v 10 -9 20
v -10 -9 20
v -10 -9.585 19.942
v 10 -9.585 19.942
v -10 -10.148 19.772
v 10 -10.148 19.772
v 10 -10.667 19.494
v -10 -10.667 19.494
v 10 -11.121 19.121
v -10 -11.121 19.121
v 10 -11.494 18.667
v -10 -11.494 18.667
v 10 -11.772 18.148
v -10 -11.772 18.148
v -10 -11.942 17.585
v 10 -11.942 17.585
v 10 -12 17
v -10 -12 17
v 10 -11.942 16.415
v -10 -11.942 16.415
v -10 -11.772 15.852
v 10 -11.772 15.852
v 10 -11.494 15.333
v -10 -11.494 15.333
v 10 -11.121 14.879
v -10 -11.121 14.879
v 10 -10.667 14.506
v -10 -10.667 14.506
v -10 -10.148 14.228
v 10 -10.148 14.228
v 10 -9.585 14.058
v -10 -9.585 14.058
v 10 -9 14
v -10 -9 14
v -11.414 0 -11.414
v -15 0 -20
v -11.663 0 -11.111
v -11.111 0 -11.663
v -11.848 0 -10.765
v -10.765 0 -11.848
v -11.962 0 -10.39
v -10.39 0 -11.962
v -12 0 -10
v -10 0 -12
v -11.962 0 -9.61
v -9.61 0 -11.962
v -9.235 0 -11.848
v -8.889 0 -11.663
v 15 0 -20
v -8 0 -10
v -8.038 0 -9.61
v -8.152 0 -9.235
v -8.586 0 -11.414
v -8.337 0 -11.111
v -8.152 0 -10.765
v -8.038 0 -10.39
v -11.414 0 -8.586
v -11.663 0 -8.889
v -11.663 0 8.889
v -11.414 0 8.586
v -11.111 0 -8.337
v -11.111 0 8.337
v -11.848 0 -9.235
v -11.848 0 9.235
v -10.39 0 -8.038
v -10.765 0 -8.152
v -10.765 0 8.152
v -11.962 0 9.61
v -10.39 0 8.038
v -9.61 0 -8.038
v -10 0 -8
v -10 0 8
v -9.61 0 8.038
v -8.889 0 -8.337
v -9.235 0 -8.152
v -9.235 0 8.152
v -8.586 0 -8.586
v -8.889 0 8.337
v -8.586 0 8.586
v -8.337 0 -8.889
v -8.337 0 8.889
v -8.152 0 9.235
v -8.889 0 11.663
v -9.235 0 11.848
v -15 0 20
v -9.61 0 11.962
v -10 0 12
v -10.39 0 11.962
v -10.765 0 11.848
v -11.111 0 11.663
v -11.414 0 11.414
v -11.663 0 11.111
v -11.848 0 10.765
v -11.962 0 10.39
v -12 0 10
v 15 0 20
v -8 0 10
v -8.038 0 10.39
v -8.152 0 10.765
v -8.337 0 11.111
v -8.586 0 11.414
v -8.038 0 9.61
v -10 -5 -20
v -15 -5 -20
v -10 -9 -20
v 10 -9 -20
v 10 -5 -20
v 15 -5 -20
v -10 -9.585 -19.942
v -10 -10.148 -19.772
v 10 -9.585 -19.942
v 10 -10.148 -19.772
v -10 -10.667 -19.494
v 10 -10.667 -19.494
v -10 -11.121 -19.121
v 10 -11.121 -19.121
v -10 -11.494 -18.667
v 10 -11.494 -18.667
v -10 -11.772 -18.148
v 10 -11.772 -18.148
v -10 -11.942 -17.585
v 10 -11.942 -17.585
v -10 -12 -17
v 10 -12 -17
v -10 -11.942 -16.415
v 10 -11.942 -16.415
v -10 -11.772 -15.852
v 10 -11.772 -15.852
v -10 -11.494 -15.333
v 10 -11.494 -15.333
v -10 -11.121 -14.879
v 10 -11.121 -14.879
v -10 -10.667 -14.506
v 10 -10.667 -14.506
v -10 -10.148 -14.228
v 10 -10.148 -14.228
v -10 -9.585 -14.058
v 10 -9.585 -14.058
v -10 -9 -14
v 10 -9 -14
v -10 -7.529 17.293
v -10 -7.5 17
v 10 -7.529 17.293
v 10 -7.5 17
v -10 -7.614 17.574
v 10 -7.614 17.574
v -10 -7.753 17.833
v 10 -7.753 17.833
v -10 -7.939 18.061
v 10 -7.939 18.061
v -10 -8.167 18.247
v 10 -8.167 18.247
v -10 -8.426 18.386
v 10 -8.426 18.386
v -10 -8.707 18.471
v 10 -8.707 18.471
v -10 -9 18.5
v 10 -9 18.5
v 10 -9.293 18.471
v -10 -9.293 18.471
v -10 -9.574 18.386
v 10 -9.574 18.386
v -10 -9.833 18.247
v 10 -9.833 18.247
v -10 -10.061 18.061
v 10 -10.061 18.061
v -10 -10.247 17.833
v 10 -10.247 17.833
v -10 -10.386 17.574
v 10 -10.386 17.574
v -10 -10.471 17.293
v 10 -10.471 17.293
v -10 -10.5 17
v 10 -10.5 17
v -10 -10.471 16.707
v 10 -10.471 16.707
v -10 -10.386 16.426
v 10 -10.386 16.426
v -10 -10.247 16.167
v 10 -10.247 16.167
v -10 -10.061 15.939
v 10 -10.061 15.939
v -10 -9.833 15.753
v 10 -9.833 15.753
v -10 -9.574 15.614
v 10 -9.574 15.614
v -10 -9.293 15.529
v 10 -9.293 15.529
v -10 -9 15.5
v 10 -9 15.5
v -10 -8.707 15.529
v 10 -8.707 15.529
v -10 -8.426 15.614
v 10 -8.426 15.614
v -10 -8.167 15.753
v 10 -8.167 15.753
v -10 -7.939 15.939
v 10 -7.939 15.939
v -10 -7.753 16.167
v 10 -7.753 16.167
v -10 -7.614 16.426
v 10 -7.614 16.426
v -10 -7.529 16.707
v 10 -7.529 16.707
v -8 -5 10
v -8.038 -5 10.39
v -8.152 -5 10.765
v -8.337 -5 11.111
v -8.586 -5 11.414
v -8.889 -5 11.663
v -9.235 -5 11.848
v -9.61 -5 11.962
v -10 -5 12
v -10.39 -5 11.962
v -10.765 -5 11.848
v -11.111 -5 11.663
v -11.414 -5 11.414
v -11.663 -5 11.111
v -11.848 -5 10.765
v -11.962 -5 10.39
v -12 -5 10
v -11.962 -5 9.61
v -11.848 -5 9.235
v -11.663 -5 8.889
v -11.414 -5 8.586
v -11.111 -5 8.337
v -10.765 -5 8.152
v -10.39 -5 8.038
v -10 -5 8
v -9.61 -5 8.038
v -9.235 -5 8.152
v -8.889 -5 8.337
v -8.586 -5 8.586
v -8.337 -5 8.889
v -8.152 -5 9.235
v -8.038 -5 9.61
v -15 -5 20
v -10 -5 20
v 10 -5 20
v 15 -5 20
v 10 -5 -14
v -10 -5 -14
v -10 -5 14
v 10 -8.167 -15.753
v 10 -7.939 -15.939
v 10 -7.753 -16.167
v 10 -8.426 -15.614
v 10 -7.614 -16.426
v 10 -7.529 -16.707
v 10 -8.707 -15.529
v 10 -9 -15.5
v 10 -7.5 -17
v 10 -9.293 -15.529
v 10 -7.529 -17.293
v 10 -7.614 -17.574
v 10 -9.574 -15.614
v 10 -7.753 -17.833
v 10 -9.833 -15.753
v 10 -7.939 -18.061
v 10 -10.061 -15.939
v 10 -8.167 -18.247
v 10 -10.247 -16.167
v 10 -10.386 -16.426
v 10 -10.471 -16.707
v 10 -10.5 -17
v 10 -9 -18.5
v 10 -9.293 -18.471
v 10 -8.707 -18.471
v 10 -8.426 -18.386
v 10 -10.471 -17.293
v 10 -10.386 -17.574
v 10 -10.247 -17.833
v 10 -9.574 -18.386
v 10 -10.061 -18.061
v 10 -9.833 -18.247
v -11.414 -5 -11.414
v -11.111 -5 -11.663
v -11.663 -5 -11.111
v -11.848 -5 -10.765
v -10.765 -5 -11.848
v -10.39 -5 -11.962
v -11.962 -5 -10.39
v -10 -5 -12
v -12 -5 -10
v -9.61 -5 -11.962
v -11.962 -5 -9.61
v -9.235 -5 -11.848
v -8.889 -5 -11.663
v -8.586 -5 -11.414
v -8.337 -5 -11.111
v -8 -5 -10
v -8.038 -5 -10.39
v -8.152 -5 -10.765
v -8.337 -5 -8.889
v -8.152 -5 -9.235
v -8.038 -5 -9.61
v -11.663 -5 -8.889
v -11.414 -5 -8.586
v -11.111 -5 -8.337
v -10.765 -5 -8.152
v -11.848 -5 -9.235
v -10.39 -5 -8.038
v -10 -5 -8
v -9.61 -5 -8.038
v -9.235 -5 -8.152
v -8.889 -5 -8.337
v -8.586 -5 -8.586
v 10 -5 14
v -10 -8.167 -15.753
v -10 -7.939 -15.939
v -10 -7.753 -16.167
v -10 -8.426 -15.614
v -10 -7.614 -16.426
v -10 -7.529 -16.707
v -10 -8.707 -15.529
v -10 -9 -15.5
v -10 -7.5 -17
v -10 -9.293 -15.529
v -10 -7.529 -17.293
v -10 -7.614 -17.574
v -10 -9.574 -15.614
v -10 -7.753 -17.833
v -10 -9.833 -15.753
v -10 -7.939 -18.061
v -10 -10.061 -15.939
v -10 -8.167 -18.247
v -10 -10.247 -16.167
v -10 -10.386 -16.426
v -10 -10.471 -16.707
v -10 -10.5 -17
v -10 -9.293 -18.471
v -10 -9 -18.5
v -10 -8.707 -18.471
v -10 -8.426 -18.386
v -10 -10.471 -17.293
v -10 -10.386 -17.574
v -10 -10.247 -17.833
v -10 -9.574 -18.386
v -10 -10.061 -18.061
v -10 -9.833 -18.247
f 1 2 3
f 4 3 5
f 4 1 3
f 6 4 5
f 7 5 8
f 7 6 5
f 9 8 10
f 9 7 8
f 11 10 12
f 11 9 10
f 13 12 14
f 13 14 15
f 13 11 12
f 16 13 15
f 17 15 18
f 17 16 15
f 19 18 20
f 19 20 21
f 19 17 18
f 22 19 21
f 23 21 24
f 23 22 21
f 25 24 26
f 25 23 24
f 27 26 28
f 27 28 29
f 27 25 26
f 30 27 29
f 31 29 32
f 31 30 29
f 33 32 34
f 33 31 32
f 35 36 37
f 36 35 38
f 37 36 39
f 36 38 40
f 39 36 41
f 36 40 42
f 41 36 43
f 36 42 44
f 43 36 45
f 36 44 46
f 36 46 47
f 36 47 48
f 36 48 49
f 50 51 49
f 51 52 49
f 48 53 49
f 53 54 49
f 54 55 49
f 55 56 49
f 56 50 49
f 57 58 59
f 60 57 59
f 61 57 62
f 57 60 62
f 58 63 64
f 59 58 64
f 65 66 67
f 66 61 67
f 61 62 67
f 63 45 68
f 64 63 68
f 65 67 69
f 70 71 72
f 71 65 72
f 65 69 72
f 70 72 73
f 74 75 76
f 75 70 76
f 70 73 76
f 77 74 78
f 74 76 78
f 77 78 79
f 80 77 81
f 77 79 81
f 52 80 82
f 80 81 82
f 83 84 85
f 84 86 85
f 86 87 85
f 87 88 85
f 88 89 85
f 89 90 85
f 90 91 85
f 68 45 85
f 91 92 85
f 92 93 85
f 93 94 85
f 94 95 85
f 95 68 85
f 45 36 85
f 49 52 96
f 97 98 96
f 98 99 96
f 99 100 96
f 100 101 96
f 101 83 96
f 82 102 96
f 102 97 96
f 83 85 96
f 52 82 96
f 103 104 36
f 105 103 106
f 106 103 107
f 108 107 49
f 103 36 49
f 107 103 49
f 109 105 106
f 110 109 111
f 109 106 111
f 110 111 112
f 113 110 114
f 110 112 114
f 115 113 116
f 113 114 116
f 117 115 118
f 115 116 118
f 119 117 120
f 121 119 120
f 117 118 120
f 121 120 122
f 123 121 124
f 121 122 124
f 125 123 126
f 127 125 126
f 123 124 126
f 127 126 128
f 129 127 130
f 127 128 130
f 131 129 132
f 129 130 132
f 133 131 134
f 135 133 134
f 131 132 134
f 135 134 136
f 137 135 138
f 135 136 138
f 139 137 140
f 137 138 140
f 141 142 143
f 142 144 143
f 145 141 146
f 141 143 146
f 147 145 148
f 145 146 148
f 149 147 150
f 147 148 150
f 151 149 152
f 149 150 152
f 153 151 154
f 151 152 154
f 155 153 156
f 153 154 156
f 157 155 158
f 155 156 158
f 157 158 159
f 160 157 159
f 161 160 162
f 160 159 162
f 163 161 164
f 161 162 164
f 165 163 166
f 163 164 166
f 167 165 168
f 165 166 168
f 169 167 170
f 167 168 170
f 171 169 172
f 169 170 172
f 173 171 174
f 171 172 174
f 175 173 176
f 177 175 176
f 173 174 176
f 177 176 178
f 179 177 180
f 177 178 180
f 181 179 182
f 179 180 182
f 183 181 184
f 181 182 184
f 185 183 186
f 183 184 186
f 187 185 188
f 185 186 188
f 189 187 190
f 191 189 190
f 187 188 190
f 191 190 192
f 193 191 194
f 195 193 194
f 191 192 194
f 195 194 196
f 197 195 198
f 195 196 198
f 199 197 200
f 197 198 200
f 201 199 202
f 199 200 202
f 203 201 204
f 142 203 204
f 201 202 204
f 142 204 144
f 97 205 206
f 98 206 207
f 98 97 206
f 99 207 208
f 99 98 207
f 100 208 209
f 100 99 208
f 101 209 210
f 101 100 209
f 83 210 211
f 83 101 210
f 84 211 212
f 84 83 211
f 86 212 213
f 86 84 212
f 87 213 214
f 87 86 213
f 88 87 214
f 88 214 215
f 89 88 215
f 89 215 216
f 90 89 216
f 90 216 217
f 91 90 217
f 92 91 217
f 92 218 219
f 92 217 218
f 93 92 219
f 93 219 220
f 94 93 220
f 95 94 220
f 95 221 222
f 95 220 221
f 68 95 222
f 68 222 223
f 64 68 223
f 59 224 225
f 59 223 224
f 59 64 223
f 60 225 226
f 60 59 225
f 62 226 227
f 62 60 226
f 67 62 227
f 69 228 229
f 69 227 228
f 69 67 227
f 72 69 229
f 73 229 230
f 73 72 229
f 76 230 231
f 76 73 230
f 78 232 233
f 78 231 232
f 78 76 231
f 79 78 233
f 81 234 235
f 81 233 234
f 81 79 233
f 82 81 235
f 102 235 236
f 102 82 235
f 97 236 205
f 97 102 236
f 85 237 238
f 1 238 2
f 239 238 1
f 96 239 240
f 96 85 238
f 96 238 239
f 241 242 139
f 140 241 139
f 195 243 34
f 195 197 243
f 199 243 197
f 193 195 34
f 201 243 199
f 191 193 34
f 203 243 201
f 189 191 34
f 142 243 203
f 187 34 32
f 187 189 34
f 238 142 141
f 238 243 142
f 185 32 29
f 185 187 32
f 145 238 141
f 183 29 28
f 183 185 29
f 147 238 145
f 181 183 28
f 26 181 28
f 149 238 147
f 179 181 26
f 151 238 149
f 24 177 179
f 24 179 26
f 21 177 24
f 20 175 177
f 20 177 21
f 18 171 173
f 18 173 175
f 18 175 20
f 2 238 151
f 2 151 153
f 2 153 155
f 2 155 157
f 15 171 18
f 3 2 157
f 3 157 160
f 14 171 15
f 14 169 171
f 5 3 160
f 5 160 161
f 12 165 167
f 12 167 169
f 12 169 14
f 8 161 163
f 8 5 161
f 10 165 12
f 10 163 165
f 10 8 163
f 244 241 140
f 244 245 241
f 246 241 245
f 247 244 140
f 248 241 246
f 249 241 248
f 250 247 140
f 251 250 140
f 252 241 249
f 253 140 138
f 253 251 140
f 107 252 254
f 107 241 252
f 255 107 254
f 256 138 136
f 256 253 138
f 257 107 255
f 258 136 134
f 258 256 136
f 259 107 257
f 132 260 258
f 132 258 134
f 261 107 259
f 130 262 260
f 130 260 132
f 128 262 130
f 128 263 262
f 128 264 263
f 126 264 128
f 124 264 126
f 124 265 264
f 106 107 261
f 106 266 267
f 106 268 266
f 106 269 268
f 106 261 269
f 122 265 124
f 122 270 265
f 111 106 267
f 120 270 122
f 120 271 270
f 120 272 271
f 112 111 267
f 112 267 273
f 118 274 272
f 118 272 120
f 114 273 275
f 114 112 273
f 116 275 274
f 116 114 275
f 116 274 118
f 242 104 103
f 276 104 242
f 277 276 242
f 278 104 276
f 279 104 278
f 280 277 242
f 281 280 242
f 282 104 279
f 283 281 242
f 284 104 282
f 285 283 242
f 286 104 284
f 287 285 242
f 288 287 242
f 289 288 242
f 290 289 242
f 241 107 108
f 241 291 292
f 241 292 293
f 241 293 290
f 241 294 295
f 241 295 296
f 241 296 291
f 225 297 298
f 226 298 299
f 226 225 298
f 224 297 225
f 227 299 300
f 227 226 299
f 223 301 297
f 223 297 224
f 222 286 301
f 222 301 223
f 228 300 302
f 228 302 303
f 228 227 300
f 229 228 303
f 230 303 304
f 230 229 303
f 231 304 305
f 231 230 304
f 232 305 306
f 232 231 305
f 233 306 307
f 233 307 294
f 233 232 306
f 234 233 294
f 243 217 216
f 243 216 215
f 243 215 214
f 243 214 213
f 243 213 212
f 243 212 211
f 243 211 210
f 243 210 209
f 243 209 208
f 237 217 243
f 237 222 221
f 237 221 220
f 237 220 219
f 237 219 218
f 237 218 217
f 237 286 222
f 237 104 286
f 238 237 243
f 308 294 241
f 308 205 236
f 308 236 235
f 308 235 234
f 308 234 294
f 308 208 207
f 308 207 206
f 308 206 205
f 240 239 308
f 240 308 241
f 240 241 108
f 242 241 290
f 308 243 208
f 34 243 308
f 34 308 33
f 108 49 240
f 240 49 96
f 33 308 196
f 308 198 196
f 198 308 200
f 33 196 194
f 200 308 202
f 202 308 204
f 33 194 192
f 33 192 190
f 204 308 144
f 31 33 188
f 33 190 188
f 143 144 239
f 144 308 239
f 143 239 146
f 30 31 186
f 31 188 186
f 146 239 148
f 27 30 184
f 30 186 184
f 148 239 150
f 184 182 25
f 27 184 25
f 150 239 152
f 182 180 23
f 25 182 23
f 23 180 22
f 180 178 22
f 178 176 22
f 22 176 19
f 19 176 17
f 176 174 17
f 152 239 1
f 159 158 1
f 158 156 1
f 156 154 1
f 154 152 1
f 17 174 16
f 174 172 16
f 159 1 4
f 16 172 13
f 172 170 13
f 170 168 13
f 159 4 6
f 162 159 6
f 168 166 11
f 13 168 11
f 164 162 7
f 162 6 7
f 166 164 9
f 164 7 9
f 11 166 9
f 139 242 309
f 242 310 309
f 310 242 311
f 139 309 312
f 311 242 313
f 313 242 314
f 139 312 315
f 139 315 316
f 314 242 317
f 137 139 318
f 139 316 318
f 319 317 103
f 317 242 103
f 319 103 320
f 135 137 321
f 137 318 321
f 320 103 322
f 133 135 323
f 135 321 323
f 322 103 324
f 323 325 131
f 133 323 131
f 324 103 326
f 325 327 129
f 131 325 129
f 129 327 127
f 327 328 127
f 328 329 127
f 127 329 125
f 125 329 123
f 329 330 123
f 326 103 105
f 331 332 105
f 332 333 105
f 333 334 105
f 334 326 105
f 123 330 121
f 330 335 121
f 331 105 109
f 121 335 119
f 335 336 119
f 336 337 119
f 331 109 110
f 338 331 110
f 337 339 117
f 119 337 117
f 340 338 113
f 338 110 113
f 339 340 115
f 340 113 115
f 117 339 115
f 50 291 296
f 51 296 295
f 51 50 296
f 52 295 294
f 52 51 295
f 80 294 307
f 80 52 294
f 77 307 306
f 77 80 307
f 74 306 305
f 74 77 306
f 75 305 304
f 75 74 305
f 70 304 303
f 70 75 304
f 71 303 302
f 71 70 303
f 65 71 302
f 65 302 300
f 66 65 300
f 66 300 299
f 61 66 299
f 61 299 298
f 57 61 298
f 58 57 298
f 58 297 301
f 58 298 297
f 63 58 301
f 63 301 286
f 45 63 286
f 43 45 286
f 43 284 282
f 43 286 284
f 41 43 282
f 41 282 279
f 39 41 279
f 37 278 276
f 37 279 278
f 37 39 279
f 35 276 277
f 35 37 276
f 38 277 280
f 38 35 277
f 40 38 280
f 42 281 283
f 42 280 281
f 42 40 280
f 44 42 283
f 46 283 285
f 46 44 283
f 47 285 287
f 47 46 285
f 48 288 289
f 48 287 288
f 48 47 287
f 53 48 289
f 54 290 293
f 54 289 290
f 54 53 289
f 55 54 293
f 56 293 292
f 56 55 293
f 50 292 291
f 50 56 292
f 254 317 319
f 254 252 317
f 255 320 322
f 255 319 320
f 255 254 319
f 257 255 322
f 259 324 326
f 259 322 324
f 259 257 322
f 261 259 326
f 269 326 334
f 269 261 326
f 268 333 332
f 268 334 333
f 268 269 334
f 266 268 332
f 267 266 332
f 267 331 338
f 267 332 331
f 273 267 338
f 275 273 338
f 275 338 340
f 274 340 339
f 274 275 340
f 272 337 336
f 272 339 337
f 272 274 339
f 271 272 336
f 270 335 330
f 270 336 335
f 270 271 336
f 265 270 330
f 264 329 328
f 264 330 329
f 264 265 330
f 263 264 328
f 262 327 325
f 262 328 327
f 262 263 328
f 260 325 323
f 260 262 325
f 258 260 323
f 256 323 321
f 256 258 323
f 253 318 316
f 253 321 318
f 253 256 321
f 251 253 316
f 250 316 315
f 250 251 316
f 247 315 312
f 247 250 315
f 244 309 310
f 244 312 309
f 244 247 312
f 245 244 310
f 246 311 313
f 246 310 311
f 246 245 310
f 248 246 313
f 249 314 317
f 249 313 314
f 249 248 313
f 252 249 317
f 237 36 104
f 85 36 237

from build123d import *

# Parameters (mm, degrees)
SKETCH_W          = 30
SKETCH_H          = 40
PAD_DEPTH         = 5
PAD001_DEPTH      = 10
SKETCH002_R       = 1.5
POCKET_DEPTH      = 117.840681
POCKET_DEPTH_BACK = 117.840681
SKETCH003_R       = 2
POCKET001_DEPTH   = 12.001


with BuildPart() as part:
    # Sketch (on DatumPlane) → Pad (new body)
    with BuildSketch(Plane.XZ):
        Rectangle(SKETCH_W, SKETCH_H)
    extrude(amount=PAD_DEPTH)

    # Sketch001 (on DatumPlane) → Pad001 (join, symmetric)
    with BuildSketch(Plane.YZ):
        with BuildLine():
            Line((-9, 20), (-5, 20))
            Line((-5, 20), (-5, 14))
            Line((-5, 14), (-9, 14))
            ThreePointArc((-9, 20), (-12, 17), (-9, 14))
        make_face()
    pad001 = extrude(amount=PAD001_DEPTH, both=True)

    # Sketch002 (on DatumPlane) → Pocket (cut, two sides)
    with BuildSketch(Plane.YZ) as pocket_sk:
        with Locations((-9, 17)):
            Circle(SKETCH002_R)
    pocket = extrude(amount=-POCKET_DEPTH, mode=Mode.SUBTRACT) + extrude(pocket_sk.sketch, amount=POCKET_DEPTH_BACK, mode=Mode.SUBTRACT)

    # Mirrored: Pad001, Pocket across XY
    add(pad001.mirror(Plane.XY))
    add(pocket.mirror(Plane.XY), mode=Mode.SUBTRACT)

    # Sketch003 (on DatumPlane) → Pocket001 (cut, through all)
    with BuildSketch(Plane.XZ):
        with Locations((-10, 10)):
            Circle(SKETCH003_R)
        with Locations((-10, -10)):
            Circle(SKETCH003_R)
    extrude(amount=POCKET001_DEPTH, mode=Mode.SUBTRACT)


solid = part.part
